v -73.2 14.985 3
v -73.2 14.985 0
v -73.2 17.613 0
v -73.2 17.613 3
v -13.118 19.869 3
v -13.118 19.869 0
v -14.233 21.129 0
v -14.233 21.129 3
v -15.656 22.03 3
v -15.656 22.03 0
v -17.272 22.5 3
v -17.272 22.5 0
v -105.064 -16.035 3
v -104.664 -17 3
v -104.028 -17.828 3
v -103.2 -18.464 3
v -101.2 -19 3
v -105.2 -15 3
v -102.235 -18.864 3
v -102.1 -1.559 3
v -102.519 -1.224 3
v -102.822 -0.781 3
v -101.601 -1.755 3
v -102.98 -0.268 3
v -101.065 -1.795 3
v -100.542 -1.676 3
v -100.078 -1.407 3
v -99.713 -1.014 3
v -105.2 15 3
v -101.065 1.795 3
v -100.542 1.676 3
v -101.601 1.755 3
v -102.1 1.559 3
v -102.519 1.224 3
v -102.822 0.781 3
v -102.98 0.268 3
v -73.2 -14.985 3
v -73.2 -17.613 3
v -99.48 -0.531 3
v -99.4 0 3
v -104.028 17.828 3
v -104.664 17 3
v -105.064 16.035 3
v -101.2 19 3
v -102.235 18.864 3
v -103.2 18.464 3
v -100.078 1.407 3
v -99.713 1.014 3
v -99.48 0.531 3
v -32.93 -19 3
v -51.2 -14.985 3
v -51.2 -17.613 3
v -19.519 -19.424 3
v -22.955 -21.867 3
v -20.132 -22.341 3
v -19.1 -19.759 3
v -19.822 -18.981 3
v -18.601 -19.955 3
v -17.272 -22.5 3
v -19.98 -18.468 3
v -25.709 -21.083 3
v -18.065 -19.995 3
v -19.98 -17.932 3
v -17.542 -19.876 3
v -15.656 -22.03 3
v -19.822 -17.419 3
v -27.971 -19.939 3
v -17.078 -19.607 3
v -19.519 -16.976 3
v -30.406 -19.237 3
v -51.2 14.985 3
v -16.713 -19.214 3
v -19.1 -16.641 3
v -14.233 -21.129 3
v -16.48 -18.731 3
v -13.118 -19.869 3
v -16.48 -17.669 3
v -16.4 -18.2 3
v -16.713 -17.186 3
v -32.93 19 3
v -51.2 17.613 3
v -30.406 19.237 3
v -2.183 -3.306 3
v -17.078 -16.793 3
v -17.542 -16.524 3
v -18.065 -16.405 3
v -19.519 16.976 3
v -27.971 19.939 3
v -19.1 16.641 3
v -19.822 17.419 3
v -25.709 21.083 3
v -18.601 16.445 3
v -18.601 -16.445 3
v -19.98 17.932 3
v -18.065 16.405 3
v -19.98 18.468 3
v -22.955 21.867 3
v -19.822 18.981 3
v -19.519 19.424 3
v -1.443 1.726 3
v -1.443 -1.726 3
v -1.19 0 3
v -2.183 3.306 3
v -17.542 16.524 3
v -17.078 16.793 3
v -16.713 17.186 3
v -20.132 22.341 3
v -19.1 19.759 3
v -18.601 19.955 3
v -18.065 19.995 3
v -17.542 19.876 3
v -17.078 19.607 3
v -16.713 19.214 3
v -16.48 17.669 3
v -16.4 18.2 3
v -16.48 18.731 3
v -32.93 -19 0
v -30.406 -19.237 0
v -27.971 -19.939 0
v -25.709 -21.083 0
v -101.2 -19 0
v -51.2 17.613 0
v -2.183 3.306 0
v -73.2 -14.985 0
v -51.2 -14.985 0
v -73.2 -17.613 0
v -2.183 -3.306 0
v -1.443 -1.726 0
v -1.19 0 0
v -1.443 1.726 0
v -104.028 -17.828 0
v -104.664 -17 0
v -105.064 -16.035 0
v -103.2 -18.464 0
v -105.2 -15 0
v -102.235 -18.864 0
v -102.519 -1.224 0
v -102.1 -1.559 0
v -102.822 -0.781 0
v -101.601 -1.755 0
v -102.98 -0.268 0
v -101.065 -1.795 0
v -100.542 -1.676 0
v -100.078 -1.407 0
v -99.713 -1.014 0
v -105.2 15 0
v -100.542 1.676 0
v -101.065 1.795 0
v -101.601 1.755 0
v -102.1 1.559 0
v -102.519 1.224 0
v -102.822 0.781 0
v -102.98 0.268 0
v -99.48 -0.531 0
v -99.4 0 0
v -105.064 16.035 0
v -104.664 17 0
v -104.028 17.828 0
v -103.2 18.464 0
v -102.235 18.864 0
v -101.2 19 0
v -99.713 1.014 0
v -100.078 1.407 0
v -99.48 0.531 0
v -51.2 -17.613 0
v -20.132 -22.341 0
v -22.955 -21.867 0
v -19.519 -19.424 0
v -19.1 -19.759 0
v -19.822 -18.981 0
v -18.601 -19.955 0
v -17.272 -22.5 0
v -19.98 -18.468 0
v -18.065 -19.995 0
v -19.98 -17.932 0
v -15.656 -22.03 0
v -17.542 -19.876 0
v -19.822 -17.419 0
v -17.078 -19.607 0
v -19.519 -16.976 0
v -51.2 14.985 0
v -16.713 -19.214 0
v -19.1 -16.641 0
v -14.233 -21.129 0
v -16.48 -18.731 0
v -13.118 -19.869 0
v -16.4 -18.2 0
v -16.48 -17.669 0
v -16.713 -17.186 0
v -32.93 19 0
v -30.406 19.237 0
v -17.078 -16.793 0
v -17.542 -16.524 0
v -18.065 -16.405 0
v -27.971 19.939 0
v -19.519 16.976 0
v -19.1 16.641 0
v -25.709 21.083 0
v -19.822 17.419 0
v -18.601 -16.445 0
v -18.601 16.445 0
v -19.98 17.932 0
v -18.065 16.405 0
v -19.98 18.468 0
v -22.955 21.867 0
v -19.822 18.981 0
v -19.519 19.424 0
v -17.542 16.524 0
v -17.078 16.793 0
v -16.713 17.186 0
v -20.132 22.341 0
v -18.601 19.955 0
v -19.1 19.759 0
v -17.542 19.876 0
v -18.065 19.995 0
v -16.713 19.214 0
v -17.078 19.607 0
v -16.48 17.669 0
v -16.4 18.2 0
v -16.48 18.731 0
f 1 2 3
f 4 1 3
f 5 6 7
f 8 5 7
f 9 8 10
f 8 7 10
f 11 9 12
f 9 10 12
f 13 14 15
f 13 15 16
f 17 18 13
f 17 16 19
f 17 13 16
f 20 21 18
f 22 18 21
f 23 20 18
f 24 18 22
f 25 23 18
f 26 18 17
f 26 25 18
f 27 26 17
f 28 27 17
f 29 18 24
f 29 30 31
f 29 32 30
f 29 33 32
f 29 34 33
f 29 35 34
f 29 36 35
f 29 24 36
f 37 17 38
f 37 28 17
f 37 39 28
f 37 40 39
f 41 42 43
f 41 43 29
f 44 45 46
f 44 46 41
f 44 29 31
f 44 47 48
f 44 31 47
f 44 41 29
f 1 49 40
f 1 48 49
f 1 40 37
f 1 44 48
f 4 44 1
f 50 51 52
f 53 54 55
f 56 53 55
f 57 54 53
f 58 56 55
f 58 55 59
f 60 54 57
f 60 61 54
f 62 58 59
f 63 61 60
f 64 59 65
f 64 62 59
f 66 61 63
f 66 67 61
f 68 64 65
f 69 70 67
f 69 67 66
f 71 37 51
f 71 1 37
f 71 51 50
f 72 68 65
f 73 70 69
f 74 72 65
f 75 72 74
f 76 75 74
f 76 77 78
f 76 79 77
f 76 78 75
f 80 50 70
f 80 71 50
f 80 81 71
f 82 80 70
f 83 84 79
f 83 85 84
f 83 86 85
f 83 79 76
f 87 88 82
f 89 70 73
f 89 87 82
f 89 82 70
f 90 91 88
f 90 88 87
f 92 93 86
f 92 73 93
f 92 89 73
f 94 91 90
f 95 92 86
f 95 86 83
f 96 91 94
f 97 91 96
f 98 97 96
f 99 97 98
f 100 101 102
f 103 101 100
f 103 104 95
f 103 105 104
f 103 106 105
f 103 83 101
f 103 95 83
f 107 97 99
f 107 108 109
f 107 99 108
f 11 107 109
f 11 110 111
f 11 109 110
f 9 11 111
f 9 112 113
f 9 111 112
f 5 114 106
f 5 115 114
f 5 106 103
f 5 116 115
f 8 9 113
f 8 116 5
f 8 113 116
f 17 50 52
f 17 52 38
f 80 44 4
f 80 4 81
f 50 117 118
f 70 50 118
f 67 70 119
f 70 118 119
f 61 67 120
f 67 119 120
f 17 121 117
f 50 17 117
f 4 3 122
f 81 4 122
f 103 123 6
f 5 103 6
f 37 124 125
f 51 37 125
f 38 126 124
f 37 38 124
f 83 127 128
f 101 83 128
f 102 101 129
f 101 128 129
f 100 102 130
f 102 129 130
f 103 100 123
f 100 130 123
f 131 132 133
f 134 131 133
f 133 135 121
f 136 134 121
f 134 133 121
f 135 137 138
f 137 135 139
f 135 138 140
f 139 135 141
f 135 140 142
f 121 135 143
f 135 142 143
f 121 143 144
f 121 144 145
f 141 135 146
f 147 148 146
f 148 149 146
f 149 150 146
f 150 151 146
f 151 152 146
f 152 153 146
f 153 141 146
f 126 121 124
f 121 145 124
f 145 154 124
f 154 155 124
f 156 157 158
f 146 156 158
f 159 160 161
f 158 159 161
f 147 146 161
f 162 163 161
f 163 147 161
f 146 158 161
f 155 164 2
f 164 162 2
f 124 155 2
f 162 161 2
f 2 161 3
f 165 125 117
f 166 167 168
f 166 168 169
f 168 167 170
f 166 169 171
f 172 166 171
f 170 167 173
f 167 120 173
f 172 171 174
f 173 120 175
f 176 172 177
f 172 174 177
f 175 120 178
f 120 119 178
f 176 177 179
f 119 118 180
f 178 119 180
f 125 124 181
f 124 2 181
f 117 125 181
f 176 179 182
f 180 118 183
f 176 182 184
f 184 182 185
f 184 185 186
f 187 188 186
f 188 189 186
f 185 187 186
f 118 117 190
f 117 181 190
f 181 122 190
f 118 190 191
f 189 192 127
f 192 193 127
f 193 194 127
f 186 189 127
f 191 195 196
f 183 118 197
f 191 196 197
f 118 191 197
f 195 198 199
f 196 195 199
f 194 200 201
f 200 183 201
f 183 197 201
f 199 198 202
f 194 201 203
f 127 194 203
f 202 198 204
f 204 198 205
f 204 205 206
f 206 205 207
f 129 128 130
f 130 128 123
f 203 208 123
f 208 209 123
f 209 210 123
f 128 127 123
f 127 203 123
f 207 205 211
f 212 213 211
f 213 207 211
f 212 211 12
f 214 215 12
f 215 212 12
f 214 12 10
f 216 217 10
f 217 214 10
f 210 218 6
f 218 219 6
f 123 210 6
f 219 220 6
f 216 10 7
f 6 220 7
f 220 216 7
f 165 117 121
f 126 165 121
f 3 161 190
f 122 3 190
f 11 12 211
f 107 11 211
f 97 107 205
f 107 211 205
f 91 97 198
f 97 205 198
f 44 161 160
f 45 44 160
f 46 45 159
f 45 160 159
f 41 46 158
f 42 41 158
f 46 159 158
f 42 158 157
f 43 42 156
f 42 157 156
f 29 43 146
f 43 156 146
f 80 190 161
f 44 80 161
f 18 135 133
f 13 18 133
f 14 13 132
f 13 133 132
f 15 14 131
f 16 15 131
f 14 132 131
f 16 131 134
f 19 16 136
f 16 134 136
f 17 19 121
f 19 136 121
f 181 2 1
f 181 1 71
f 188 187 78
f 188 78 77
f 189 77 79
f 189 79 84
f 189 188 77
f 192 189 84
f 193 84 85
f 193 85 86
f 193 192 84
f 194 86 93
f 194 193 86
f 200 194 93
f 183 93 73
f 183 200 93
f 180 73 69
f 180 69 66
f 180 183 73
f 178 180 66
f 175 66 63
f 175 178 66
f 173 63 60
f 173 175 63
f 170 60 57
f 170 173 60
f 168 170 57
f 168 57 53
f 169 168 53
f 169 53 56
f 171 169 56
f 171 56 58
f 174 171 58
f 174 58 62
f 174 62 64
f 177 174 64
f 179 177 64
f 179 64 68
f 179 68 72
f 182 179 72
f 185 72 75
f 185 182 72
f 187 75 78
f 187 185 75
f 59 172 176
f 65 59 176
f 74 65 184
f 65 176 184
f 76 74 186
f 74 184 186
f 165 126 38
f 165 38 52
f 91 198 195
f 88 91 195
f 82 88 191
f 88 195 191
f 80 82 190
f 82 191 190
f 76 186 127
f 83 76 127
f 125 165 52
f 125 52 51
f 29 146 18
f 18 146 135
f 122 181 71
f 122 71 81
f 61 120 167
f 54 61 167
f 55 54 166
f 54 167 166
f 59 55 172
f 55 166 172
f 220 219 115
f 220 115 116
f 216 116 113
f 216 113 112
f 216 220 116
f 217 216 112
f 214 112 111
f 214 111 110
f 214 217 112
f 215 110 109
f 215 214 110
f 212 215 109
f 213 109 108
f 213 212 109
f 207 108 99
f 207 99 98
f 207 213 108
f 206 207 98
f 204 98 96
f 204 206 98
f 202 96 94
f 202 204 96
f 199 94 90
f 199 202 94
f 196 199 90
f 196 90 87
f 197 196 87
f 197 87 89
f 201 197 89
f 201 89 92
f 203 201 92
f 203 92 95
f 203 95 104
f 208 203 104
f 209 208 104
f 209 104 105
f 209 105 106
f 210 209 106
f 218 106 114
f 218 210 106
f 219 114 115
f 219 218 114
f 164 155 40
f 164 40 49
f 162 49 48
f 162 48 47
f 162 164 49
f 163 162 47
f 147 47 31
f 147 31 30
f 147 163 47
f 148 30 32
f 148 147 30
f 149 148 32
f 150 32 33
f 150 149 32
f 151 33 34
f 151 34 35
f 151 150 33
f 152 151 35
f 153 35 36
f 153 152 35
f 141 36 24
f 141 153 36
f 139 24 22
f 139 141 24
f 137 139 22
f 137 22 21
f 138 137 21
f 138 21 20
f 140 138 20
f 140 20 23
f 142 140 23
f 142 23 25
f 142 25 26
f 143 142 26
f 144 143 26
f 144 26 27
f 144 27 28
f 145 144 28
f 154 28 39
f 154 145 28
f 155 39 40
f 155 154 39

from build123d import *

# Parameters (mm, degrees)
F0_W     = 22
F0_H     = 2.627969
F0_R     = 1.8
F1_DEPTH = 3


with BuildPart() as f1:
    # F0 (on Top) → F1 (new body)
    with BuildSketch(Plane.XY):
        with BuildLine():
            Line((-70.846429, 19), (-101.2, 19))
            ThreePointArc((-101.2, 19), (-104.028427, 17.828427), (-105.2, 15))
            Line((-105.2, 15), (-105.2, -15))
            ThreePointArc((-105.2, -15), (-104.028427, -17.828427), (-101.2, -19))
            Line((-101.2, -19), (-70.846429, -19))
            Line((-70.846429, -19), (-32.929577, -19))
            ThreePointArc((-32.929577, -19), (-29.172307, -19.531094), (-25.709437, -21.082761))
            ThreePointArc((-25.709437, -21.082761), (-21.550048, -22.143225), (-17.272454, -22.5))
            ThreePointArc((-17.272454, -22.5), (-14.912775, -21.629956), (-13.117664, -19.868527))
            Line((-13.117664, -19.868527), (-2.182587, -3.305832))
            ThreePointArc((-2.182587, -3.305832), (-1.18973, 0), (-2.182587, 3.305832))
            Line((-2.182587, 3.305832), (-13.117664, 19.868527))
            ThreePointArc((-13.117664, 19.868527), (-14.912775, 21.629956), (-17.272454, 22.5))
            ThreePointArc((-17.272454, 22.5), (-21.550048, 22.143225), (-25.709437, 21.082761))
            ThreePointArc((-25.709437, 21.082761), (-29.172307, 19.531094), (-32.929577, 19))
            Line((-32.929577, 19), (-70.846429, 19))
        make_face()
        with Locations((-62.2, -16.299169)):
            Rectangle(F0_W, F0_H, mode=Mode.SUBTRACT)
        with Locations((-18.2, -18.2)):
            Circle(F0_R, mode=Mode.SUBTRACT)
        with Locations((-101.2, 0)):
            Circle(F0_R, mode=Mode.SUBTRACT)
        with Locations((-62.2, 16.299169)):
            Rectangle(F0_W, F0_H, mode=Mode.SUBTRACT)
        with Locations((-18.2, 18.2)):
            Circle(F0_R, mode=Mode.SUBTRACT)
    extrude(amount=F1_DEPTH)


solid = f1.part
